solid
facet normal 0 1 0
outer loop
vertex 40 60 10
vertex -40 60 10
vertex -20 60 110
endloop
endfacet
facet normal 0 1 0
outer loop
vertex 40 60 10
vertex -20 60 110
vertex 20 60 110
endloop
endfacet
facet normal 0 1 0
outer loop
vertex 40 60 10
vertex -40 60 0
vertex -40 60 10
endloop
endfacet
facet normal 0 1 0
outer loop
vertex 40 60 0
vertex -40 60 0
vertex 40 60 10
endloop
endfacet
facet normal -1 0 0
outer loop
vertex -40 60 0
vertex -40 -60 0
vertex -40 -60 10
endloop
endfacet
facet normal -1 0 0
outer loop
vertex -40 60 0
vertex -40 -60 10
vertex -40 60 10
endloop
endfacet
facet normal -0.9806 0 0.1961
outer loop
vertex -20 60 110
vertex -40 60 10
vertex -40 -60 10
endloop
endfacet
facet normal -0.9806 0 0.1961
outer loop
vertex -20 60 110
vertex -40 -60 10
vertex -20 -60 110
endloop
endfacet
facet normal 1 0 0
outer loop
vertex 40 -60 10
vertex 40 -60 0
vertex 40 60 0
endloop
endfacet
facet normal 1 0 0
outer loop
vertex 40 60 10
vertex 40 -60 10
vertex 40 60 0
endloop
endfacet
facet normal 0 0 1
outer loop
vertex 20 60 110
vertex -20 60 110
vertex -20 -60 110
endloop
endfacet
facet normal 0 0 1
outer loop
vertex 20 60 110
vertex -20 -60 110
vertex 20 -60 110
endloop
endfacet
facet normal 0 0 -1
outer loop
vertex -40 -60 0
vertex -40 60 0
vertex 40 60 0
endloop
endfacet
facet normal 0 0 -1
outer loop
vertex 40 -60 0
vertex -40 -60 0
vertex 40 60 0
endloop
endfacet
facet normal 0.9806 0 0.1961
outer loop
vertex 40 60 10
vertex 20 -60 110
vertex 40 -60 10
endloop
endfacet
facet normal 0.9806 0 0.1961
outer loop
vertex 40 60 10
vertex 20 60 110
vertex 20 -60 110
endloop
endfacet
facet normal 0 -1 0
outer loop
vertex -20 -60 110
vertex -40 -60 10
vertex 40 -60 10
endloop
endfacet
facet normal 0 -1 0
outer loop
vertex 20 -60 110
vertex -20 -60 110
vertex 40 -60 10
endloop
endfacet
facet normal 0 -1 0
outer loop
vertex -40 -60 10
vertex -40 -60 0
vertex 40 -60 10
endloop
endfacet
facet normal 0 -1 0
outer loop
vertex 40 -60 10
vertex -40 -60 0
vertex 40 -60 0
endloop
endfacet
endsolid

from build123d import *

# Parameters (mm, degrees)
SKETCH1_W           = 80
SKETCH1_H           = 120
BOSS_EXTRUDE1_DEPTH = 10
BOSS_EXTRUDE2_DEPTH = 60


with BuildPart() as part:
    # Sketch1 → Boss-Extrude1 (new body)
    with BuildSketch(Plane.XY):
        Rectangle(SKETCH1_W, SKETCH1_H)
    extrude(amount=BOSS_EXTRUDE1_DEPTH)

    # Sketch2 → Boss-Extrude2 (add, symmetric)
    with BuildSketch(Plane(origin=(0, 0, 0), x_dir=(1, 0, 0), z_dir=(0, 1, 0))):
        Polygon((40, -10), (-40, -10), (-20, -110), (20, -110), align=None)
    extrude(amount=BOSS_EXTRUDE2_DEPTH, both=True)


solid = part.part
